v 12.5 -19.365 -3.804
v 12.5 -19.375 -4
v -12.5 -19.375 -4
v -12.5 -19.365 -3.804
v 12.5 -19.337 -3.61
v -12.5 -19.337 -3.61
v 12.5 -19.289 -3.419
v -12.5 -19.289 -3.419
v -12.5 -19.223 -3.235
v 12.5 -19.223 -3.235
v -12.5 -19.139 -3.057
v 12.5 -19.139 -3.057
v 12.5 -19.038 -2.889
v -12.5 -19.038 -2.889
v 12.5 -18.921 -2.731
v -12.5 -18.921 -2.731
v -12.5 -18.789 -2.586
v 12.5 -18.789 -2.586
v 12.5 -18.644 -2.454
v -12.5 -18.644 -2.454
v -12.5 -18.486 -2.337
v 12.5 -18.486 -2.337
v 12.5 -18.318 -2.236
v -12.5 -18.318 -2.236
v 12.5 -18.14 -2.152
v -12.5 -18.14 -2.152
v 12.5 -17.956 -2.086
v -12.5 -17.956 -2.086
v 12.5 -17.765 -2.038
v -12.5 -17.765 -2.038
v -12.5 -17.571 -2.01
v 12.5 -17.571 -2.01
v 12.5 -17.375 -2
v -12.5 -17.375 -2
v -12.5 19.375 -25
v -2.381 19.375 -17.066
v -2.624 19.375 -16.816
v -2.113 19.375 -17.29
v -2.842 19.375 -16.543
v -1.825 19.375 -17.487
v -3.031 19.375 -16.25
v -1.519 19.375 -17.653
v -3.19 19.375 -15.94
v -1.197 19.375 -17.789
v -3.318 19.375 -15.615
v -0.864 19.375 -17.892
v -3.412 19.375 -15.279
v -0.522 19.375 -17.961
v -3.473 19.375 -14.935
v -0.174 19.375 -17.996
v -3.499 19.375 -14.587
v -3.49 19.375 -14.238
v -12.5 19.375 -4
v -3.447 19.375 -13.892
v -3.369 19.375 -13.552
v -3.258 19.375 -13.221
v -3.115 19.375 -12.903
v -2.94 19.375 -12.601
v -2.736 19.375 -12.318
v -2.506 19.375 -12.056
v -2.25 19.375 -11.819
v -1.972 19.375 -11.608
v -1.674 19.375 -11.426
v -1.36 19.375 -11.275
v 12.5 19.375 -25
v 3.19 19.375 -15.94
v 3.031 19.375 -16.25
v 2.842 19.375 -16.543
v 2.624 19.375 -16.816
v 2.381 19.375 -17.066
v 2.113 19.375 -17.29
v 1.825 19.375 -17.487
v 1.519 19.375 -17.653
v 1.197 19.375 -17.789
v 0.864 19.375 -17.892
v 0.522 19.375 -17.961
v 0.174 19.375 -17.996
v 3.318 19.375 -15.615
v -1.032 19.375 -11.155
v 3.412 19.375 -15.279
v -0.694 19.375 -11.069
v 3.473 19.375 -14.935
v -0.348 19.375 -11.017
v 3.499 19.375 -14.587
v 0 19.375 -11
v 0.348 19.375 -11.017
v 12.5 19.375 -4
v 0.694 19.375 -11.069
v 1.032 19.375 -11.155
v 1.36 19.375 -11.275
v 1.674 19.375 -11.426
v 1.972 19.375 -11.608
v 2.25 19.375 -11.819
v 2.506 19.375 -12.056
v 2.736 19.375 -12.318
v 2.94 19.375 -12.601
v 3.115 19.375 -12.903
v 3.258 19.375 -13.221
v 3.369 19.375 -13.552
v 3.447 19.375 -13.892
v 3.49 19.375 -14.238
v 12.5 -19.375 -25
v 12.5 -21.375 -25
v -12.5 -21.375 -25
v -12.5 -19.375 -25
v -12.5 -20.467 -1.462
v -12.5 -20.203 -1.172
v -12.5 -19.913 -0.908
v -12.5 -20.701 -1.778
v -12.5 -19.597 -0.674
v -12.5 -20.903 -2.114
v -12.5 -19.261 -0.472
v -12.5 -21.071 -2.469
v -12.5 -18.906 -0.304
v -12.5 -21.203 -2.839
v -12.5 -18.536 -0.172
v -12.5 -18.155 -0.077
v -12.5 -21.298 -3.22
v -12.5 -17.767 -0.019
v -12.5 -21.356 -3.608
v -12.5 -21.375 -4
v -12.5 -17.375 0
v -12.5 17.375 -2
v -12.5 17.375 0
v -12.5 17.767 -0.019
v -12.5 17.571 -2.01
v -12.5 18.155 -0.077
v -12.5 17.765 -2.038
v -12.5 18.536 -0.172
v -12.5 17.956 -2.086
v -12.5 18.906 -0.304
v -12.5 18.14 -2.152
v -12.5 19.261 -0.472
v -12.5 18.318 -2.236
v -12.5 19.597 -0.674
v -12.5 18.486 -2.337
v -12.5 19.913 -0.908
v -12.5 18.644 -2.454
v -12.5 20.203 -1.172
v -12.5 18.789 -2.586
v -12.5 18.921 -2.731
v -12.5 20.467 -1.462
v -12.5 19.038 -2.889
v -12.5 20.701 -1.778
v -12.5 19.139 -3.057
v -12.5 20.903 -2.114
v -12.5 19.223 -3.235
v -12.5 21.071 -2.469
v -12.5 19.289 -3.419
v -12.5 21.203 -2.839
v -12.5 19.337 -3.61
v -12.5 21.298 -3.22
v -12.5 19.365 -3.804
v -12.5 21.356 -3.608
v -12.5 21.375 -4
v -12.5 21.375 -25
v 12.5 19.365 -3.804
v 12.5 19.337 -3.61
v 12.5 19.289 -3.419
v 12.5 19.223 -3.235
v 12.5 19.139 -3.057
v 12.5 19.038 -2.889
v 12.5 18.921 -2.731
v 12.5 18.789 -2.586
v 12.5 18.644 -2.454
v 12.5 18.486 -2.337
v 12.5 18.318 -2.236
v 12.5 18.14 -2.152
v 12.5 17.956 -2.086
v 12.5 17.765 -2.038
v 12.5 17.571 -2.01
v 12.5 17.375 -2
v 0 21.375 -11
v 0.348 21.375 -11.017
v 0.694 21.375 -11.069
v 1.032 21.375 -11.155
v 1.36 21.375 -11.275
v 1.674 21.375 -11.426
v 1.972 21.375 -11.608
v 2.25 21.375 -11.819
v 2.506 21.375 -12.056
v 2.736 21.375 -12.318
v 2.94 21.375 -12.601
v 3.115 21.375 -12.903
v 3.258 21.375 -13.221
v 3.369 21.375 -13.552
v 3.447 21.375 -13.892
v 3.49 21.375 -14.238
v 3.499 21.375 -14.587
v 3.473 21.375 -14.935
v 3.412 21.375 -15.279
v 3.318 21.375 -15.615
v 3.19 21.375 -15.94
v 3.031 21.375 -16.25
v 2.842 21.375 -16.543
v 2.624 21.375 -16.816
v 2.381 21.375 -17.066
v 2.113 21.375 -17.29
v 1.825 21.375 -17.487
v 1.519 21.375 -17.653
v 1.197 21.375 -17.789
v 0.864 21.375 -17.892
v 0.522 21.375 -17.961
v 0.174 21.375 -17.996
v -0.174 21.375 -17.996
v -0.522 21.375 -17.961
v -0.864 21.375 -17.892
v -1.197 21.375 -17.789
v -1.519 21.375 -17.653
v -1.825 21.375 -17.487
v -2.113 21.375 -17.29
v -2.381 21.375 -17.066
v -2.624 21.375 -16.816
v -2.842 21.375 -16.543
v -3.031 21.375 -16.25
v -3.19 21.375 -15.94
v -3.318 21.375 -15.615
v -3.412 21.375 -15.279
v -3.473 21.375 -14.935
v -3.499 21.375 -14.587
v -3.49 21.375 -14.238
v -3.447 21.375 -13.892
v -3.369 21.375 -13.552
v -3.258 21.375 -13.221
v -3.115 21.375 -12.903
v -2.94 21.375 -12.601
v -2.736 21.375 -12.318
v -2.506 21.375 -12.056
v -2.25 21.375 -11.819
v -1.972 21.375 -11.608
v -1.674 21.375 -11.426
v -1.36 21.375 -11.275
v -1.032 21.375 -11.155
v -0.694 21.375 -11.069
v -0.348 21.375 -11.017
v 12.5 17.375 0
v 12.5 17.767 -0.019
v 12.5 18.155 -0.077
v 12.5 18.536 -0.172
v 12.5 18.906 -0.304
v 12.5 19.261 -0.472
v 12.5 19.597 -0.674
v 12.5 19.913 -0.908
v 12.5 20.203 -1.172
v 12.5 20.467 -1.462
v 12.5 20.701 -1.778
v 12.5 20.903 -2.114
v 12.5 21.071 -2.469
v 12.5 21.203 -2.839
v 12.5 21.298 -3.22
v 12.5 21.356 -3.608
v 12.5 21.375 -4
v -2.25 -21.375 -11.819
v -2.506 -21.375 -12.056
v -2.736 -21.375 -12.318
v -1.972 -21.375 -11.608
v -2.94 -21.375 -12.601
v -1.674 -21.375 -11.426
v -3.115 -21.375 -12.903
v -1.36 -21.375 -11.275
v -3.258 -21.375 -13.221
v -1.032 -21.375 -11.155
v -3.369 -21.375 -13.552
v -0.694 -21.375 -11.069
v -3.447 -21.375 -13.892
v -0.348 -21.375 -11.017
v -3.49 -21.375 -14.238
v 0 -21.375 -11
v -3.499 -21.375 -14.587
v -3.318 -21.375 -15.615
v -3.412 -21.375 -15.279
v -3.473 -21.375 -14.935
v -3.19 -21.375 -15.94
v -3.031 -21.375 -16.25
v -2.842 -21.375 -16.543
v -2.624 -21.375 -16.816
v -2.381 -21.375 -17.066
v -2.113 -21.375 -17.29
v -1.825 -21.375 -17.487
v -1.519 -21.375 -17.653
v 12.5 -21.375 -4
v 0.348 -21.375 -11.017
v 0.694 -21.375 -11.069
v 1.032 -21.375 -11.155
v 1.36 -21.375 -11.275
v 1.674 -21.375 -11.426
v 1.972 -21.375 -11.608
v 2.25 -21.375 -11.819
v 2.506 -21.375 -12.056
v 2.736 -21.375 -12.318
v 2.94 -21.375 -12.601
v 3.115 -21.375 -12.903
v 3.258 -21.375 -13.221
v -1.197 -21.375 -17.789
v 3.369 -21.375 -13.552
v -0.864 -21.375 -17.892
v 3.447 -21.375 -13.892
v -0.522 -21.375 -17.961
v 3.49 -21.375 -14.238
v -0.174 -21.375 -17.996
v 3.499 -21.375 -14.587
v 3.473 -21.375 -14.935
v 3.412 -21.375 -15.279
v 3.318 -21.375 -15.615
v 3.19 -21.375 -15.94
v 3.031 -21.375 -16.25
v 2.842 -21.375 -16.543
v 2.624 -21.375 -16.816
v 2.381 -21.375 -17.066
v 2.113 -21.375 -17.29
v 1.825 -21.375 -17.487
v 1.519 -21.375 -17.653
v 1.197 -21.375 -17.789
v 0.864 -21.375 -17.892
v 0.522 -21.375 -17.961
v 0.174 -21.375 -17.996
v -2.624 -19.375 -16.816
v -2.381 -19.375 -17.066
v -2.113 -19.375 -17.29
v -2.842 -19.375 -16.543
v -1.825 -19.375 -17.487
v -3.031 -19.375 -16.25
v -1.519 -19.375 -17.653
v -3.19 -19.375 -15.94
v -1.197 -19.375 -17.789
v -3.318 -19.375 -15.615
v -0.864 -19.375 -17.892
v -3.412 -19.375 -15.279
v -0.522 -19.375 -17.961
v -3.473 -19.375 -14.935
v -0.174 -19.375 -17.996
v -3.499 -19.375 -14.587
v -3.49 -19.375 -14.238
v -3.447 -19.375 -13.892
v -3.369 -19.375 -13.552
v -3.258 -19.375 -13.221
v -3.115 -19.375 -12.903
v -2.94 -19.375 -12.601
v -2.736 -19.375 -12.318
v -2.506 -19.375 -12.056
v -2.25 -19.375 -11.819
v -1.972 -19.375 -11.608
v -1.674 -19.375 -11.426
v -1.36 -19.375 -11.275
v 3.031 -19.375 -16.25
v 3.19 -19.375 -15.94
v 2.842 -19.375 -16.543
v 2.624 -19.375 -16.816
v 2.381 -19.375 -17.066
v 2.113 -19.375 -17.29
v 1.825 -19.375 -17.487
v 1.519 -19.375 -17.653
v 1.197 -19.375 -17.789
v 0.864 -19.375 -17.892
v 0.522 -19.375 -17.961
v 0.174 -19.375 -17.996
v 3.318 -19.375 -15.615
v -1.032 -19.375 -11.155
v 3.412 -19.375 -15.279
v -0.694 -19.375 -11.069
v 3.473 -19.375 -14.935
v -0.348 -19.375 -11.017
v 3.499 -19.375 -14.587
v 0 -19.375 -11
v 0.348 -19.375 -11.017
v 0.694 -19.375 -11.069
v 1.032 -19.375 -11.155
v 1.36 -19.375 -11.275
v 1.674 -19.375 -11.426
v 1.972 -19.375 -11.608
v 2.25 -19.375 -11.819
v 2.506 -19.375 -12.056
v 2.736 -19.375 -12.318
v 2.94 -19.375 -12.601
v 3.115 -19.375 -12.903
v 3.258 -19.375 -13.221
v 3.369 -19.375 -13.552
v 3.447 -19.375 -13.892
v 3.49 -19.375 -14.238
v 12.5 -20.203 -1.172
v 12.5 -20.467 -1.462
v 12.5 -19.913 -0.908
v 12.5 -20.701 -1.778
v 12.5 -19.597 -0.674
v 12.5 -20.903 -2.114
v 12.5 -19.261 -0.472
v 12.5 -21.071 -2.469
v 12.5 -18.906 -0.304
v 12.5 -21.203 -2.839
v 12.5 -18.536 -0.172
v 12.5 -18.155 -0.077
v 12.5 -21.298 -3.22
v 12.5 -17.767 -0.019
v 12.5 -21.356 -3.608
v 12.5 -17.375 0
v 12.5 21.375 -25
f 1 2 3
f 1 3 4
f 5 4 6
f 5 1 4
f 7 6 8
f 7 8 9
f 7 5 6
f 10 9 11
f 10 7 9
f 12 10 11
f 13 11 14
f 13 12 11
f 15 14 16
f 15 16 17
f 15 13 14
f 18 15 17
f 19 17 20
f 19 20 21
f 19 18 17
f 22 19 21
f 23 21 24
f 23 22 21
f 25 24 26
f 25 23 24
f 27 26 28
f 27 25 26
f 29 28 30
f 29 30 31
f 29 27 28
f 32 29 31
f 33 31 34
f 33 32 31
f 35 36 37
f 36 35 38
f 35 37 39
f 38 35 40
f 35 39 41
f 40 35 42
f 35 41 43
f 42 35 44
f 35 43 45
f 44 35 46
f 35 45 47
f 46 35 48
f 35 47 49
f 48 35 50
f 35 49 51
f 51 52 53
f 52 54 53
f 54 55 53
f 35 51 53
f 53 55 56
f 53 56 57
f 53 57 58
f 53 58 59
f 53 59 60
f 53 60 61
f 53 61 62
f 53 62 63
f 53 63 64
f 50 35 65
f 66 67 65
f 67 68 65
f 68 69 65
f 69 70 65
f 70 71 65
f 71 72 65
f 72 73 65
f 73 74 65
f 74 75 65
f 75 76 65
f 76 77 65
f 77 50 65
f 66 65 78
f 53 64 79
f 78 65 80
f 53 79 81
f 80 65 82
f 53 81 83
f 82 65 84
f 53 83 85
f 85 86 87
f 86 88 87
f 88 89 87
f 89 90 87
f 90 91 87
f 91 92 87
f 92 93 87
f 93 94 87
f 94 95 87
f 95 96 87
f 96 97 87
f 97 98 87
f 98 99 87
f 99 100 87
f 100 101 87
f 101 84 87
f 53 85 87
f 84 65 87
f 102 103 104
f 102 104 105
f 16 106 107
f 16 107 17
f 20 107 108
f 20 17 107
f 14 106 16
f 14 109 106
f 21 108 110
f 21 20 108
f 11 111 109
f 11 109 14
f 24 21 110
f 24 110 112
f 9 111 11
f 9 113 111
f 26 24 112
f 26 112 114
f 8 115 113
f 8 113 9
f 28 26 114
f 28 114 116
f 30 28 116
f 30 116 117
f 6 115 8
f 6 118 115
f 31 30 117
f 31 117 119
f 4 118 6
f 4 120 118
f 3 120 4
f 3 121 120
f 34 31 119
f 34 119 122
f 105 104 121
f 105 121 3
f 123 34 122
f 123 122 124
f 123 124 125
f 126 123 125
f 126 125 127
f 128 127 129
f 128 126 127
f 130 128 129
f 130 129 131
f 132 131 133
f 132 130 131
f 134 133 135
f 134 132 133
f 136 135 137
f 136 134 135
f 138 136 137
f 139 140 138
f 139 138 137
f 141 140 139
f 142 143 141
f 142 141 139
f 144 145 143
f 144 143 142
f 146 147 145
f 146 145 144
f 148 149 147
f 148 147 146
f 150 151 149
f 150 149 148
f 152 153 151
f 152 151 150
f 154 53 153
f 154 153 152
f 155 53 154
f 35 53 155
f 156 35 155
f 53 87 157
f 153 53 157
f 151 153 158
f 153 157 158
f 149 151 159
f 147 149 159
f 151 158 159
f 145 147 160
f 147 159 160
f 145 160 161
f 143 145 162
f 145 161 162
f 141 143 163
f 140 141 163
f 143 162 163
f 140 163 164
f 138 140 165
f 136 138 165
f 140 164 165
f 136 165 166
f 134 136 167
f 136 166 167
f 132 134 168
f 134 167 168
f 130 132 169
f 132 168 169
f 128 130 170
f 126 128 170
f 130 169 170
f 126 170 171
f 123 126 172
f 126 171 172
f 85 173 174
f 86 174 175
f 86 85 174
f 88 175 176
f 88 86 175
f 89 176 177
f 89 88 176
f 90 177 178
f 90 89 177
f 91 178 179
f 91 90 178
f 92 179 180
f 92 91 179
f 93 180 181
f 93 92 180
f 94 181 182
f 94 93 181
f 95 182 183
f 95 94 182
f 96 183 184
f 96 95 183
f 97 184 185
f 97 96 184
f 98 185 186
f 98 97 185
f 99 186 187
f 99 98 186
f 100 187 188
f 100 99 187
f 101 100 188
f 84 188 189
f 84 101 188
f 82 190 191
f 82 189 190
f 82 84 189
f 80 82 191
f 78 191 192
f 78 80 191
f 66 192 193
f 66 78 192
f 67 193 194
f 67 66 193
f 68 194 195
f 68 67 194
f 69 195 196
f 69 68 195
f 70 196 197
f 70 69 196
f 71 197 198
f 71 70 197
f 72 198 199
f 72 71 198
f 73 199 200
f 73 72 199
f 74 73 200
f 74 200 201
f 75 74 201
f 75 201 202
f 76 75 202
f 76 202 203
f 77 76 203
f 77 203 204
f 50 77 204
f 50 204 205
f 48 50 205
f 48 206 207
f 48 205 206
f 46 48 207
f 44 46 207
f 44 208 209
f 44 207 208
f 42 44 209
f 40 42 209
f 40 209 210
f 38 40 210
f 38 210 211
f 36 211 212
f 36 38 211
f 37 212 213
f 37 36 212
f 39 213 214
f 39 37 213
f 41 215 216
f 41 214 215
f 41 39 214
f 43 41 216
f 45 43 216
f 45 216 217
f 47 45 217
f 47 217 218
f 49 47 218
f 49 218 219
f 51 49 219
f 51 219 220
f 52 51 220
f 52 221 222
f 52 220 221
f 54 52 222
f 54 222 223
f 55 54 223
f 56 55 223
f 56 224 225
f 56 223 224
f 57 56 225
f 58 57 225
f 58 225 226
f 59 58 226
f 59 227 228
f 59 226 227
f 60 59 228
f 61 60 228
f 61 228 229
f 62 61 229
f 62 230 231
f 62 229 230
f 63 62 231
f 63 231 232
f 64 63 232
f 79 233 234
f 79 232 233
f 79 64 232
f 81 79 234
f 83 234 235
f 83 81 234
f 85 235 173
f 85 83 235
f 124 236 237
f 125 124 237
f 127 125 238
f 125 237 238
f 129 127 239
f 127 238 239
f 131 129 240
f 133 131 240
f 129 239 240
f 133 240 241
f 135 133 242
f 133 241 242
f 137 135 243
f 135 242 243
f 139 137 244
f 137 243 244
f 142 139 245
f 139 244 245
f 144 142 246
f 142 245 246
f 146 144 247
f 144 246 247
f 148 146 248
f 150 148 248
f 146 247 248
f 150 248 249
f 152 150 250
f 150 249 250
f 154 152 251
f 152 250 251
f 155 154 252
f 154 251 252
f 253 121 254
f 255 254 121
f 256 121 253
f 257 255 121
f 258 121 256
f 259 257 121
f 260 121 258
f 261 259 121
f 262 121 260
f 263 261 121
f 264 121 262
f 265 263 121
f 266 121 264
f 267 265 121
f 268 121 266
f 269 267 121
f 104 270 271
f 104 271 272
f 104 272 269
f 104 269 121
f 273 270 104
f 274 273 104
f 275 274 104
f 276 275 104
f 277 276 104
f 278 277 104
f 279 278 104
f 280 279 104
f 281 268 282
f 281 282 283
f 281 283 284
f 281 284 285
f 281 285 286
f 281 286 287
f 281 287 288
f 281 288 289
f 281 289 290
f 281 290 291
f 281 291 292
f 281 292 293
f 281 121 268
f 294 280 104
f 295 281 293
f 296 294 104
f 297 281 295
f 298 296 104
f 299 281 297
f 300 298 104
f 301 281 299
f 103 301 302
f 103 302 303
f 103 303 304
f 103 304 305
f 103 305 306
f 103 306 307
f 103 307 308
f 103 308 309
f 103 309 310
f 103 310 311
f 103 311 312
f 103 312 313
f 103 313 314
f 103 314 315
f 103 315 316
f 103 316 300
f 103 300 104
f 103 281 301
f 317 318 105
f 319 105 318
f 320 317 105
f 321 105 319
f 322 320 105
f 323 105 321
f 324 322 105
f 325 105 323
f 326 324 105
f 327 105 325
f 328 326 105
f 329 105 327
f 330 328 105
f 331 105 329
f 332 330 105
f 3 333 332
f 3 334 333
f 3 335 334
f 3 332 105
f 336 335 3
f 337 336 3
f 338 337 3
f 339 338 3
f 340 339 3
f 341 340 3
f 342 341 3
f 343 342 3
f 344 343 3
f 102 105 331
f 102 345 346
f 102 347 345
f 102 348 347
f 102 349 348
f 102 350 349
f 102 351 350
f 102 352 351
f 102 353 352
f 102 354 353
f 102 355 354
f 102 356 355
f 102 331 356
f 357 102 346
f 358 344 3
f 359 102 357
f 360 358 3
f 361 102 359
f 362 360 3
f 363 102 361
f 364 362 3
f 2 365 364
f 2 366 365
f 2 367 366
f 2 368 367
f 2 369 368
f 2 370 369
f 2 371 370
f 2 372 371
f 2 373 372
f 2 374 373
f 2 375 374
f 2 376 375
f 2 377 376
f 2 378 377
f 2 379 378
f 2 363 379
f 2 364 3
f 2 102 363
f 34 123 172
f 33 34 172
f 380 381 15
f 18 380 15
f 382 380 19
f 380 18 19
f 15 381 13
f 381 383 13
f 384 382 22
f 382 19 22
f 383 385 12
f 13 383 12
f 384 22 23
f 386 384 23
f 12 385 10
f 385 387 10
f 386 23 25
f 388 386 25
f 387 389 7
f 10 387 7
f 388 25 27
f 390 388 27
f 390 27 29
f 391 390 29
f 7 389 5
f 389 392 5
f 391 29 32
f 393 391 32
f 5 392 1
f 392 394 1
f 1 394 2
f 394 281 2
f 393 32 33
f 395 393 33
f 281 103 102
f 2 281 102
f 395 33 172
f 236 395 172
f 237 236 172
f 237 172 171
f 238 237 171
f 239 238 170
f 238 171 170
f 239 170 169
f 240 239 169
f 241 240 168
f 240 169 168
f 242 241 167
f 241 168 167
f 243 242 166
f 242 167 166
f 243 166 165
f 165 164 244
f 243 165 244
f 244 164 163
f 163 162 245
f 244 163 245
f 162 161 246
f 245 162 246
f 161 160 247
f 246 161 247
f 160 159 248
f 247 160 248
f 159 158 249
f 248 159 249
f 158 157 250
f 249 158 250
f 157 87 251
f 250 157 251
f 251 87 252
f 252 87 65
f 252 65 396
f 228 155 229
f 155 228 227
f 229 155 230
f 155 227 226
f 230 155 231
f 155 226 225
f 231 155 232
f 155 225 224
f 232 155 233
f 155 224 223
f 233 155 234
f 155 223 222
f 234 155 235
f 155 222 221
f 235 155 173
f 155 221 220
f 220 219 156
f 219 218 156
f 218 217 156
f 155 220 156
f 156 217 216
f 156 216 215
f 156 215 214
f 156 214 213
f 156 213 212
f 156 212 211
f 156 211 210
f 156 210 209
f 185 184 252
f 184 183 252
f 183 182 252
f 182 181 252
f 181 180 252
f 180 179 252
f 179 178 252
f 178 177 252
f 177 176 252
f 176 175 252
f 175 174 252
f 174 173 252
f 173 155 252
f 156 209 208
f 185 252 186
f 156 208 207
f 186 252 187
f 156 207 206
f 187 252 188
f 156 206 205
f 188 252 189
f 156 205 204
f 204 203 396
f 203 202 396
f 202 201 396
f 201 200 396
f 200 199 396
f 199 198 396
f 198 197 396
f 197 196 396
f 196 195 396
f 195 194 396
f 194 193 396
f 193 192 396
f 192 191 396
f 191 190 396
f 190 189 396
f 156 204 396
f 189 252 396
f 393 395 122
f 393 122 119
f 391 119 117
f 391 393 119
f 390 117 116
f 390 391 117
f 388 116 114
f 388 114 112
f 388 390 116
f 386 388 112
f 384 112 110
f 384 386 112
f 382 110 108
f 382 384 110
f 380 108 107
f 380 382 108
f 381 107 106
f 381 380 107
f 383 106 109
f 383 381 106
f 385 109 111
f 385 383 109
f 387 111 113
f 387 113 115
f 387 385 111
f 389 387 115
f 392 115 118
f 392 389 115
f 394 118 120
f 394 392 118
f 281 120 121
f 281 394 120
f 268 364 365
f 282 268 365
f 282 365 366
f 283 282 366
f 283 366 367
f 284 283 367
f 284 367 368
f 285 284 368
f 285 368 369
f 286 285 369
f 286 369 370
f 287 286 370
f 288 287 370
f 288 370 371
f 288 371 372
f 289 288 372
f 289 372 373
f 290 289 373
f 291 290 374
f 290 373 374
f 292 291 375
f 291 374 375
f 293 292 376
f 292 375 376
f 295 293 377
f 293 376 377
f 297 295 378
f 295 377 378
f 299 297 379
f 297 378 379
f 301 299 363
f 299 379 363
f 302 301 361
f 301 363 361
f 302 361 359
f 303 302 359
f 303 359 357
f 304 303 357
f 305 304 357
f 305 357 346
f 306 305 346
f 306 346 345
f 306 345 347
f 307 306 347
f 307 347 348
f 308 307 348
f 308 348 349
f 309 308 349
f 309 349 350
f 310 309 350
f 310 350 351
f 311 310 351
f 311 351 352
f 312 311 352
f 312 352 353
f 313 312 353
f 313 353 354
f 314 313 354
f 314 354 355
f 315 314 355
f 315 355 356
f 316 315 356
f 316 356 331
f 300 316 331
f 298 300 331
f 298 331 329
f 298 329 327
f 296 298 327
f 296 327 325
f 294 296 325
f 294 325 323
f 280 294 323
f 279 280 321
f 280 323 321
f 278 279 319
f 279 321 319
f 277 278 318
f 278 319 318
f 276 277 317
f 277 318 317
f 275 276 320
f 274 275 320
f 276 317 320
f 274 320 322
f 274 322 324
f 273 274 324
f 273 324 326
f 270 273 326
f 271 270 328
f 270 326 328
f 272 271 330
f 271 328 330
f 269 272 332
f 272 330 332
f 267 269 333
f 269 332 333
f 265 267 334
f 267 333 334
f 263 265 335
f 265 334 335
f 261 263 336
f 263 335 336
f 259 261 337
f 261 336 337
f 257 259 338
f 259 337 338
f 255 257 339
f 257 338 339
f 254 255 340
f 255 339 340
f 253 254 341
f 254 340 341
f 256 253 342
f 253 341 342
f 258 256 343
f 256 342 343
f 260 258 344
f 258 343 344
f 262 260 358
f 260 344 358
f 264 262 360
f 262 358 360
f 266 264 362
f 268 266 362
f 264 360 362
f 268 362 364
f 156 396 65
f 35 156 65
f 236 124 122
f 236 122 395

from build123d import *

# Parameters (mm, degrees)
SKETCH1_W                    = 25
SKETCH1_H                    = 42.75
BASE_FLANGE2_DEPTH           = 2
EDGE_FLANGE1_STRIP_W         = 12
EDGE_FLANGE1_STRIP_H         = 2
EDGE_FLANGE1_STRIP_CUT_DEPTH = 25
EDGE_FLANGE1_DEPTH           = 25
SKETCH14_R                   = 3.5
CUT_EXTRUDE2_DEPTH           = 50.41469923


# Sheet-metal steps are written as plain solids
with BuildPart() as part:
    # Sketch1 → Base-Flange2 (new body)
    with BuildSketch(Plane.XY):
        Rectangle(SKETCH1_W, SKETCH1_H)
    extrude(amount=-BASE_FLANGE2_DEPTH)

    # Edge-Flange1 strip (across the edge) → Edge-Flange1 strip cut (cut)
    with BuildSketch(Plane(origin=(12.5, -21.375, -2), x_dir=(0, 1, 0), z_dir=(-1, 0, 0))):
        with Locations((-2, -1)):
            Rectangle(EDGE_FLANGE1_STRIP_W, EDGE_FLANGE1_STRIP_H)
    edge_flange1_strip_cut = extrude(amount=EDGE_FLANGE1_STRIP_CUT_DEPTH, mode=Mode.SUBTRACT)

    # Edge-Flange1 section (across the edge) → Edge-Flange1 (add)
    with BuildSketch(Plane(origin=(12.5, -21.375, -2), x_dir=(0, 1, 0), z_dir=(-1, 0, 0))):
        with BuildLine():
            Line((0, 2), (0, 23))
            Line((0, 23), (2, 23))
            Line((2, 23), (2, 2))
            ThreePointArc((2, 2), (2.585786438, 0.585786438), (4, 0))
            Line((4, 0), (4, -2))
            ThreePointArc((4, -2), (1.171572875, -0.828427125), (0, 2))
        make_face()
    edge_flange1 = extrude(amount=EDGE_FLANGE1_DEPTH)

    # Sketch14 → Cut-Extrude2 (cut, through all)
    with BuildSketch(Plane(origin=(0, -19.375, 0), x_dir=(1, 0, 0), z_dir=(0, 1, 0))):
        with Locations(Location((0, 14.5, 0), (0, 0, 270))):
            Circle(SKETCH14_R)
    cut_extrude2 = extrude(amount=-CUT_EXTRUDE2_DEPTH, mode=Mode.SUBTRACT)

    # Mirror1: Edge-Flange1 strip cut, Edge-Flange1, Cut-Extrude2 across plane
    add(edge_flange1_strip_cut.mirror(Plane.ZX), mode=Mode.SUBTRACT)
    add(edge_flange1.mirror(Plane.ZX))
    add(cut_extrude2.mirror(Plane.ZX), mode=Mode.SUBTRACT)


solid = part.part
